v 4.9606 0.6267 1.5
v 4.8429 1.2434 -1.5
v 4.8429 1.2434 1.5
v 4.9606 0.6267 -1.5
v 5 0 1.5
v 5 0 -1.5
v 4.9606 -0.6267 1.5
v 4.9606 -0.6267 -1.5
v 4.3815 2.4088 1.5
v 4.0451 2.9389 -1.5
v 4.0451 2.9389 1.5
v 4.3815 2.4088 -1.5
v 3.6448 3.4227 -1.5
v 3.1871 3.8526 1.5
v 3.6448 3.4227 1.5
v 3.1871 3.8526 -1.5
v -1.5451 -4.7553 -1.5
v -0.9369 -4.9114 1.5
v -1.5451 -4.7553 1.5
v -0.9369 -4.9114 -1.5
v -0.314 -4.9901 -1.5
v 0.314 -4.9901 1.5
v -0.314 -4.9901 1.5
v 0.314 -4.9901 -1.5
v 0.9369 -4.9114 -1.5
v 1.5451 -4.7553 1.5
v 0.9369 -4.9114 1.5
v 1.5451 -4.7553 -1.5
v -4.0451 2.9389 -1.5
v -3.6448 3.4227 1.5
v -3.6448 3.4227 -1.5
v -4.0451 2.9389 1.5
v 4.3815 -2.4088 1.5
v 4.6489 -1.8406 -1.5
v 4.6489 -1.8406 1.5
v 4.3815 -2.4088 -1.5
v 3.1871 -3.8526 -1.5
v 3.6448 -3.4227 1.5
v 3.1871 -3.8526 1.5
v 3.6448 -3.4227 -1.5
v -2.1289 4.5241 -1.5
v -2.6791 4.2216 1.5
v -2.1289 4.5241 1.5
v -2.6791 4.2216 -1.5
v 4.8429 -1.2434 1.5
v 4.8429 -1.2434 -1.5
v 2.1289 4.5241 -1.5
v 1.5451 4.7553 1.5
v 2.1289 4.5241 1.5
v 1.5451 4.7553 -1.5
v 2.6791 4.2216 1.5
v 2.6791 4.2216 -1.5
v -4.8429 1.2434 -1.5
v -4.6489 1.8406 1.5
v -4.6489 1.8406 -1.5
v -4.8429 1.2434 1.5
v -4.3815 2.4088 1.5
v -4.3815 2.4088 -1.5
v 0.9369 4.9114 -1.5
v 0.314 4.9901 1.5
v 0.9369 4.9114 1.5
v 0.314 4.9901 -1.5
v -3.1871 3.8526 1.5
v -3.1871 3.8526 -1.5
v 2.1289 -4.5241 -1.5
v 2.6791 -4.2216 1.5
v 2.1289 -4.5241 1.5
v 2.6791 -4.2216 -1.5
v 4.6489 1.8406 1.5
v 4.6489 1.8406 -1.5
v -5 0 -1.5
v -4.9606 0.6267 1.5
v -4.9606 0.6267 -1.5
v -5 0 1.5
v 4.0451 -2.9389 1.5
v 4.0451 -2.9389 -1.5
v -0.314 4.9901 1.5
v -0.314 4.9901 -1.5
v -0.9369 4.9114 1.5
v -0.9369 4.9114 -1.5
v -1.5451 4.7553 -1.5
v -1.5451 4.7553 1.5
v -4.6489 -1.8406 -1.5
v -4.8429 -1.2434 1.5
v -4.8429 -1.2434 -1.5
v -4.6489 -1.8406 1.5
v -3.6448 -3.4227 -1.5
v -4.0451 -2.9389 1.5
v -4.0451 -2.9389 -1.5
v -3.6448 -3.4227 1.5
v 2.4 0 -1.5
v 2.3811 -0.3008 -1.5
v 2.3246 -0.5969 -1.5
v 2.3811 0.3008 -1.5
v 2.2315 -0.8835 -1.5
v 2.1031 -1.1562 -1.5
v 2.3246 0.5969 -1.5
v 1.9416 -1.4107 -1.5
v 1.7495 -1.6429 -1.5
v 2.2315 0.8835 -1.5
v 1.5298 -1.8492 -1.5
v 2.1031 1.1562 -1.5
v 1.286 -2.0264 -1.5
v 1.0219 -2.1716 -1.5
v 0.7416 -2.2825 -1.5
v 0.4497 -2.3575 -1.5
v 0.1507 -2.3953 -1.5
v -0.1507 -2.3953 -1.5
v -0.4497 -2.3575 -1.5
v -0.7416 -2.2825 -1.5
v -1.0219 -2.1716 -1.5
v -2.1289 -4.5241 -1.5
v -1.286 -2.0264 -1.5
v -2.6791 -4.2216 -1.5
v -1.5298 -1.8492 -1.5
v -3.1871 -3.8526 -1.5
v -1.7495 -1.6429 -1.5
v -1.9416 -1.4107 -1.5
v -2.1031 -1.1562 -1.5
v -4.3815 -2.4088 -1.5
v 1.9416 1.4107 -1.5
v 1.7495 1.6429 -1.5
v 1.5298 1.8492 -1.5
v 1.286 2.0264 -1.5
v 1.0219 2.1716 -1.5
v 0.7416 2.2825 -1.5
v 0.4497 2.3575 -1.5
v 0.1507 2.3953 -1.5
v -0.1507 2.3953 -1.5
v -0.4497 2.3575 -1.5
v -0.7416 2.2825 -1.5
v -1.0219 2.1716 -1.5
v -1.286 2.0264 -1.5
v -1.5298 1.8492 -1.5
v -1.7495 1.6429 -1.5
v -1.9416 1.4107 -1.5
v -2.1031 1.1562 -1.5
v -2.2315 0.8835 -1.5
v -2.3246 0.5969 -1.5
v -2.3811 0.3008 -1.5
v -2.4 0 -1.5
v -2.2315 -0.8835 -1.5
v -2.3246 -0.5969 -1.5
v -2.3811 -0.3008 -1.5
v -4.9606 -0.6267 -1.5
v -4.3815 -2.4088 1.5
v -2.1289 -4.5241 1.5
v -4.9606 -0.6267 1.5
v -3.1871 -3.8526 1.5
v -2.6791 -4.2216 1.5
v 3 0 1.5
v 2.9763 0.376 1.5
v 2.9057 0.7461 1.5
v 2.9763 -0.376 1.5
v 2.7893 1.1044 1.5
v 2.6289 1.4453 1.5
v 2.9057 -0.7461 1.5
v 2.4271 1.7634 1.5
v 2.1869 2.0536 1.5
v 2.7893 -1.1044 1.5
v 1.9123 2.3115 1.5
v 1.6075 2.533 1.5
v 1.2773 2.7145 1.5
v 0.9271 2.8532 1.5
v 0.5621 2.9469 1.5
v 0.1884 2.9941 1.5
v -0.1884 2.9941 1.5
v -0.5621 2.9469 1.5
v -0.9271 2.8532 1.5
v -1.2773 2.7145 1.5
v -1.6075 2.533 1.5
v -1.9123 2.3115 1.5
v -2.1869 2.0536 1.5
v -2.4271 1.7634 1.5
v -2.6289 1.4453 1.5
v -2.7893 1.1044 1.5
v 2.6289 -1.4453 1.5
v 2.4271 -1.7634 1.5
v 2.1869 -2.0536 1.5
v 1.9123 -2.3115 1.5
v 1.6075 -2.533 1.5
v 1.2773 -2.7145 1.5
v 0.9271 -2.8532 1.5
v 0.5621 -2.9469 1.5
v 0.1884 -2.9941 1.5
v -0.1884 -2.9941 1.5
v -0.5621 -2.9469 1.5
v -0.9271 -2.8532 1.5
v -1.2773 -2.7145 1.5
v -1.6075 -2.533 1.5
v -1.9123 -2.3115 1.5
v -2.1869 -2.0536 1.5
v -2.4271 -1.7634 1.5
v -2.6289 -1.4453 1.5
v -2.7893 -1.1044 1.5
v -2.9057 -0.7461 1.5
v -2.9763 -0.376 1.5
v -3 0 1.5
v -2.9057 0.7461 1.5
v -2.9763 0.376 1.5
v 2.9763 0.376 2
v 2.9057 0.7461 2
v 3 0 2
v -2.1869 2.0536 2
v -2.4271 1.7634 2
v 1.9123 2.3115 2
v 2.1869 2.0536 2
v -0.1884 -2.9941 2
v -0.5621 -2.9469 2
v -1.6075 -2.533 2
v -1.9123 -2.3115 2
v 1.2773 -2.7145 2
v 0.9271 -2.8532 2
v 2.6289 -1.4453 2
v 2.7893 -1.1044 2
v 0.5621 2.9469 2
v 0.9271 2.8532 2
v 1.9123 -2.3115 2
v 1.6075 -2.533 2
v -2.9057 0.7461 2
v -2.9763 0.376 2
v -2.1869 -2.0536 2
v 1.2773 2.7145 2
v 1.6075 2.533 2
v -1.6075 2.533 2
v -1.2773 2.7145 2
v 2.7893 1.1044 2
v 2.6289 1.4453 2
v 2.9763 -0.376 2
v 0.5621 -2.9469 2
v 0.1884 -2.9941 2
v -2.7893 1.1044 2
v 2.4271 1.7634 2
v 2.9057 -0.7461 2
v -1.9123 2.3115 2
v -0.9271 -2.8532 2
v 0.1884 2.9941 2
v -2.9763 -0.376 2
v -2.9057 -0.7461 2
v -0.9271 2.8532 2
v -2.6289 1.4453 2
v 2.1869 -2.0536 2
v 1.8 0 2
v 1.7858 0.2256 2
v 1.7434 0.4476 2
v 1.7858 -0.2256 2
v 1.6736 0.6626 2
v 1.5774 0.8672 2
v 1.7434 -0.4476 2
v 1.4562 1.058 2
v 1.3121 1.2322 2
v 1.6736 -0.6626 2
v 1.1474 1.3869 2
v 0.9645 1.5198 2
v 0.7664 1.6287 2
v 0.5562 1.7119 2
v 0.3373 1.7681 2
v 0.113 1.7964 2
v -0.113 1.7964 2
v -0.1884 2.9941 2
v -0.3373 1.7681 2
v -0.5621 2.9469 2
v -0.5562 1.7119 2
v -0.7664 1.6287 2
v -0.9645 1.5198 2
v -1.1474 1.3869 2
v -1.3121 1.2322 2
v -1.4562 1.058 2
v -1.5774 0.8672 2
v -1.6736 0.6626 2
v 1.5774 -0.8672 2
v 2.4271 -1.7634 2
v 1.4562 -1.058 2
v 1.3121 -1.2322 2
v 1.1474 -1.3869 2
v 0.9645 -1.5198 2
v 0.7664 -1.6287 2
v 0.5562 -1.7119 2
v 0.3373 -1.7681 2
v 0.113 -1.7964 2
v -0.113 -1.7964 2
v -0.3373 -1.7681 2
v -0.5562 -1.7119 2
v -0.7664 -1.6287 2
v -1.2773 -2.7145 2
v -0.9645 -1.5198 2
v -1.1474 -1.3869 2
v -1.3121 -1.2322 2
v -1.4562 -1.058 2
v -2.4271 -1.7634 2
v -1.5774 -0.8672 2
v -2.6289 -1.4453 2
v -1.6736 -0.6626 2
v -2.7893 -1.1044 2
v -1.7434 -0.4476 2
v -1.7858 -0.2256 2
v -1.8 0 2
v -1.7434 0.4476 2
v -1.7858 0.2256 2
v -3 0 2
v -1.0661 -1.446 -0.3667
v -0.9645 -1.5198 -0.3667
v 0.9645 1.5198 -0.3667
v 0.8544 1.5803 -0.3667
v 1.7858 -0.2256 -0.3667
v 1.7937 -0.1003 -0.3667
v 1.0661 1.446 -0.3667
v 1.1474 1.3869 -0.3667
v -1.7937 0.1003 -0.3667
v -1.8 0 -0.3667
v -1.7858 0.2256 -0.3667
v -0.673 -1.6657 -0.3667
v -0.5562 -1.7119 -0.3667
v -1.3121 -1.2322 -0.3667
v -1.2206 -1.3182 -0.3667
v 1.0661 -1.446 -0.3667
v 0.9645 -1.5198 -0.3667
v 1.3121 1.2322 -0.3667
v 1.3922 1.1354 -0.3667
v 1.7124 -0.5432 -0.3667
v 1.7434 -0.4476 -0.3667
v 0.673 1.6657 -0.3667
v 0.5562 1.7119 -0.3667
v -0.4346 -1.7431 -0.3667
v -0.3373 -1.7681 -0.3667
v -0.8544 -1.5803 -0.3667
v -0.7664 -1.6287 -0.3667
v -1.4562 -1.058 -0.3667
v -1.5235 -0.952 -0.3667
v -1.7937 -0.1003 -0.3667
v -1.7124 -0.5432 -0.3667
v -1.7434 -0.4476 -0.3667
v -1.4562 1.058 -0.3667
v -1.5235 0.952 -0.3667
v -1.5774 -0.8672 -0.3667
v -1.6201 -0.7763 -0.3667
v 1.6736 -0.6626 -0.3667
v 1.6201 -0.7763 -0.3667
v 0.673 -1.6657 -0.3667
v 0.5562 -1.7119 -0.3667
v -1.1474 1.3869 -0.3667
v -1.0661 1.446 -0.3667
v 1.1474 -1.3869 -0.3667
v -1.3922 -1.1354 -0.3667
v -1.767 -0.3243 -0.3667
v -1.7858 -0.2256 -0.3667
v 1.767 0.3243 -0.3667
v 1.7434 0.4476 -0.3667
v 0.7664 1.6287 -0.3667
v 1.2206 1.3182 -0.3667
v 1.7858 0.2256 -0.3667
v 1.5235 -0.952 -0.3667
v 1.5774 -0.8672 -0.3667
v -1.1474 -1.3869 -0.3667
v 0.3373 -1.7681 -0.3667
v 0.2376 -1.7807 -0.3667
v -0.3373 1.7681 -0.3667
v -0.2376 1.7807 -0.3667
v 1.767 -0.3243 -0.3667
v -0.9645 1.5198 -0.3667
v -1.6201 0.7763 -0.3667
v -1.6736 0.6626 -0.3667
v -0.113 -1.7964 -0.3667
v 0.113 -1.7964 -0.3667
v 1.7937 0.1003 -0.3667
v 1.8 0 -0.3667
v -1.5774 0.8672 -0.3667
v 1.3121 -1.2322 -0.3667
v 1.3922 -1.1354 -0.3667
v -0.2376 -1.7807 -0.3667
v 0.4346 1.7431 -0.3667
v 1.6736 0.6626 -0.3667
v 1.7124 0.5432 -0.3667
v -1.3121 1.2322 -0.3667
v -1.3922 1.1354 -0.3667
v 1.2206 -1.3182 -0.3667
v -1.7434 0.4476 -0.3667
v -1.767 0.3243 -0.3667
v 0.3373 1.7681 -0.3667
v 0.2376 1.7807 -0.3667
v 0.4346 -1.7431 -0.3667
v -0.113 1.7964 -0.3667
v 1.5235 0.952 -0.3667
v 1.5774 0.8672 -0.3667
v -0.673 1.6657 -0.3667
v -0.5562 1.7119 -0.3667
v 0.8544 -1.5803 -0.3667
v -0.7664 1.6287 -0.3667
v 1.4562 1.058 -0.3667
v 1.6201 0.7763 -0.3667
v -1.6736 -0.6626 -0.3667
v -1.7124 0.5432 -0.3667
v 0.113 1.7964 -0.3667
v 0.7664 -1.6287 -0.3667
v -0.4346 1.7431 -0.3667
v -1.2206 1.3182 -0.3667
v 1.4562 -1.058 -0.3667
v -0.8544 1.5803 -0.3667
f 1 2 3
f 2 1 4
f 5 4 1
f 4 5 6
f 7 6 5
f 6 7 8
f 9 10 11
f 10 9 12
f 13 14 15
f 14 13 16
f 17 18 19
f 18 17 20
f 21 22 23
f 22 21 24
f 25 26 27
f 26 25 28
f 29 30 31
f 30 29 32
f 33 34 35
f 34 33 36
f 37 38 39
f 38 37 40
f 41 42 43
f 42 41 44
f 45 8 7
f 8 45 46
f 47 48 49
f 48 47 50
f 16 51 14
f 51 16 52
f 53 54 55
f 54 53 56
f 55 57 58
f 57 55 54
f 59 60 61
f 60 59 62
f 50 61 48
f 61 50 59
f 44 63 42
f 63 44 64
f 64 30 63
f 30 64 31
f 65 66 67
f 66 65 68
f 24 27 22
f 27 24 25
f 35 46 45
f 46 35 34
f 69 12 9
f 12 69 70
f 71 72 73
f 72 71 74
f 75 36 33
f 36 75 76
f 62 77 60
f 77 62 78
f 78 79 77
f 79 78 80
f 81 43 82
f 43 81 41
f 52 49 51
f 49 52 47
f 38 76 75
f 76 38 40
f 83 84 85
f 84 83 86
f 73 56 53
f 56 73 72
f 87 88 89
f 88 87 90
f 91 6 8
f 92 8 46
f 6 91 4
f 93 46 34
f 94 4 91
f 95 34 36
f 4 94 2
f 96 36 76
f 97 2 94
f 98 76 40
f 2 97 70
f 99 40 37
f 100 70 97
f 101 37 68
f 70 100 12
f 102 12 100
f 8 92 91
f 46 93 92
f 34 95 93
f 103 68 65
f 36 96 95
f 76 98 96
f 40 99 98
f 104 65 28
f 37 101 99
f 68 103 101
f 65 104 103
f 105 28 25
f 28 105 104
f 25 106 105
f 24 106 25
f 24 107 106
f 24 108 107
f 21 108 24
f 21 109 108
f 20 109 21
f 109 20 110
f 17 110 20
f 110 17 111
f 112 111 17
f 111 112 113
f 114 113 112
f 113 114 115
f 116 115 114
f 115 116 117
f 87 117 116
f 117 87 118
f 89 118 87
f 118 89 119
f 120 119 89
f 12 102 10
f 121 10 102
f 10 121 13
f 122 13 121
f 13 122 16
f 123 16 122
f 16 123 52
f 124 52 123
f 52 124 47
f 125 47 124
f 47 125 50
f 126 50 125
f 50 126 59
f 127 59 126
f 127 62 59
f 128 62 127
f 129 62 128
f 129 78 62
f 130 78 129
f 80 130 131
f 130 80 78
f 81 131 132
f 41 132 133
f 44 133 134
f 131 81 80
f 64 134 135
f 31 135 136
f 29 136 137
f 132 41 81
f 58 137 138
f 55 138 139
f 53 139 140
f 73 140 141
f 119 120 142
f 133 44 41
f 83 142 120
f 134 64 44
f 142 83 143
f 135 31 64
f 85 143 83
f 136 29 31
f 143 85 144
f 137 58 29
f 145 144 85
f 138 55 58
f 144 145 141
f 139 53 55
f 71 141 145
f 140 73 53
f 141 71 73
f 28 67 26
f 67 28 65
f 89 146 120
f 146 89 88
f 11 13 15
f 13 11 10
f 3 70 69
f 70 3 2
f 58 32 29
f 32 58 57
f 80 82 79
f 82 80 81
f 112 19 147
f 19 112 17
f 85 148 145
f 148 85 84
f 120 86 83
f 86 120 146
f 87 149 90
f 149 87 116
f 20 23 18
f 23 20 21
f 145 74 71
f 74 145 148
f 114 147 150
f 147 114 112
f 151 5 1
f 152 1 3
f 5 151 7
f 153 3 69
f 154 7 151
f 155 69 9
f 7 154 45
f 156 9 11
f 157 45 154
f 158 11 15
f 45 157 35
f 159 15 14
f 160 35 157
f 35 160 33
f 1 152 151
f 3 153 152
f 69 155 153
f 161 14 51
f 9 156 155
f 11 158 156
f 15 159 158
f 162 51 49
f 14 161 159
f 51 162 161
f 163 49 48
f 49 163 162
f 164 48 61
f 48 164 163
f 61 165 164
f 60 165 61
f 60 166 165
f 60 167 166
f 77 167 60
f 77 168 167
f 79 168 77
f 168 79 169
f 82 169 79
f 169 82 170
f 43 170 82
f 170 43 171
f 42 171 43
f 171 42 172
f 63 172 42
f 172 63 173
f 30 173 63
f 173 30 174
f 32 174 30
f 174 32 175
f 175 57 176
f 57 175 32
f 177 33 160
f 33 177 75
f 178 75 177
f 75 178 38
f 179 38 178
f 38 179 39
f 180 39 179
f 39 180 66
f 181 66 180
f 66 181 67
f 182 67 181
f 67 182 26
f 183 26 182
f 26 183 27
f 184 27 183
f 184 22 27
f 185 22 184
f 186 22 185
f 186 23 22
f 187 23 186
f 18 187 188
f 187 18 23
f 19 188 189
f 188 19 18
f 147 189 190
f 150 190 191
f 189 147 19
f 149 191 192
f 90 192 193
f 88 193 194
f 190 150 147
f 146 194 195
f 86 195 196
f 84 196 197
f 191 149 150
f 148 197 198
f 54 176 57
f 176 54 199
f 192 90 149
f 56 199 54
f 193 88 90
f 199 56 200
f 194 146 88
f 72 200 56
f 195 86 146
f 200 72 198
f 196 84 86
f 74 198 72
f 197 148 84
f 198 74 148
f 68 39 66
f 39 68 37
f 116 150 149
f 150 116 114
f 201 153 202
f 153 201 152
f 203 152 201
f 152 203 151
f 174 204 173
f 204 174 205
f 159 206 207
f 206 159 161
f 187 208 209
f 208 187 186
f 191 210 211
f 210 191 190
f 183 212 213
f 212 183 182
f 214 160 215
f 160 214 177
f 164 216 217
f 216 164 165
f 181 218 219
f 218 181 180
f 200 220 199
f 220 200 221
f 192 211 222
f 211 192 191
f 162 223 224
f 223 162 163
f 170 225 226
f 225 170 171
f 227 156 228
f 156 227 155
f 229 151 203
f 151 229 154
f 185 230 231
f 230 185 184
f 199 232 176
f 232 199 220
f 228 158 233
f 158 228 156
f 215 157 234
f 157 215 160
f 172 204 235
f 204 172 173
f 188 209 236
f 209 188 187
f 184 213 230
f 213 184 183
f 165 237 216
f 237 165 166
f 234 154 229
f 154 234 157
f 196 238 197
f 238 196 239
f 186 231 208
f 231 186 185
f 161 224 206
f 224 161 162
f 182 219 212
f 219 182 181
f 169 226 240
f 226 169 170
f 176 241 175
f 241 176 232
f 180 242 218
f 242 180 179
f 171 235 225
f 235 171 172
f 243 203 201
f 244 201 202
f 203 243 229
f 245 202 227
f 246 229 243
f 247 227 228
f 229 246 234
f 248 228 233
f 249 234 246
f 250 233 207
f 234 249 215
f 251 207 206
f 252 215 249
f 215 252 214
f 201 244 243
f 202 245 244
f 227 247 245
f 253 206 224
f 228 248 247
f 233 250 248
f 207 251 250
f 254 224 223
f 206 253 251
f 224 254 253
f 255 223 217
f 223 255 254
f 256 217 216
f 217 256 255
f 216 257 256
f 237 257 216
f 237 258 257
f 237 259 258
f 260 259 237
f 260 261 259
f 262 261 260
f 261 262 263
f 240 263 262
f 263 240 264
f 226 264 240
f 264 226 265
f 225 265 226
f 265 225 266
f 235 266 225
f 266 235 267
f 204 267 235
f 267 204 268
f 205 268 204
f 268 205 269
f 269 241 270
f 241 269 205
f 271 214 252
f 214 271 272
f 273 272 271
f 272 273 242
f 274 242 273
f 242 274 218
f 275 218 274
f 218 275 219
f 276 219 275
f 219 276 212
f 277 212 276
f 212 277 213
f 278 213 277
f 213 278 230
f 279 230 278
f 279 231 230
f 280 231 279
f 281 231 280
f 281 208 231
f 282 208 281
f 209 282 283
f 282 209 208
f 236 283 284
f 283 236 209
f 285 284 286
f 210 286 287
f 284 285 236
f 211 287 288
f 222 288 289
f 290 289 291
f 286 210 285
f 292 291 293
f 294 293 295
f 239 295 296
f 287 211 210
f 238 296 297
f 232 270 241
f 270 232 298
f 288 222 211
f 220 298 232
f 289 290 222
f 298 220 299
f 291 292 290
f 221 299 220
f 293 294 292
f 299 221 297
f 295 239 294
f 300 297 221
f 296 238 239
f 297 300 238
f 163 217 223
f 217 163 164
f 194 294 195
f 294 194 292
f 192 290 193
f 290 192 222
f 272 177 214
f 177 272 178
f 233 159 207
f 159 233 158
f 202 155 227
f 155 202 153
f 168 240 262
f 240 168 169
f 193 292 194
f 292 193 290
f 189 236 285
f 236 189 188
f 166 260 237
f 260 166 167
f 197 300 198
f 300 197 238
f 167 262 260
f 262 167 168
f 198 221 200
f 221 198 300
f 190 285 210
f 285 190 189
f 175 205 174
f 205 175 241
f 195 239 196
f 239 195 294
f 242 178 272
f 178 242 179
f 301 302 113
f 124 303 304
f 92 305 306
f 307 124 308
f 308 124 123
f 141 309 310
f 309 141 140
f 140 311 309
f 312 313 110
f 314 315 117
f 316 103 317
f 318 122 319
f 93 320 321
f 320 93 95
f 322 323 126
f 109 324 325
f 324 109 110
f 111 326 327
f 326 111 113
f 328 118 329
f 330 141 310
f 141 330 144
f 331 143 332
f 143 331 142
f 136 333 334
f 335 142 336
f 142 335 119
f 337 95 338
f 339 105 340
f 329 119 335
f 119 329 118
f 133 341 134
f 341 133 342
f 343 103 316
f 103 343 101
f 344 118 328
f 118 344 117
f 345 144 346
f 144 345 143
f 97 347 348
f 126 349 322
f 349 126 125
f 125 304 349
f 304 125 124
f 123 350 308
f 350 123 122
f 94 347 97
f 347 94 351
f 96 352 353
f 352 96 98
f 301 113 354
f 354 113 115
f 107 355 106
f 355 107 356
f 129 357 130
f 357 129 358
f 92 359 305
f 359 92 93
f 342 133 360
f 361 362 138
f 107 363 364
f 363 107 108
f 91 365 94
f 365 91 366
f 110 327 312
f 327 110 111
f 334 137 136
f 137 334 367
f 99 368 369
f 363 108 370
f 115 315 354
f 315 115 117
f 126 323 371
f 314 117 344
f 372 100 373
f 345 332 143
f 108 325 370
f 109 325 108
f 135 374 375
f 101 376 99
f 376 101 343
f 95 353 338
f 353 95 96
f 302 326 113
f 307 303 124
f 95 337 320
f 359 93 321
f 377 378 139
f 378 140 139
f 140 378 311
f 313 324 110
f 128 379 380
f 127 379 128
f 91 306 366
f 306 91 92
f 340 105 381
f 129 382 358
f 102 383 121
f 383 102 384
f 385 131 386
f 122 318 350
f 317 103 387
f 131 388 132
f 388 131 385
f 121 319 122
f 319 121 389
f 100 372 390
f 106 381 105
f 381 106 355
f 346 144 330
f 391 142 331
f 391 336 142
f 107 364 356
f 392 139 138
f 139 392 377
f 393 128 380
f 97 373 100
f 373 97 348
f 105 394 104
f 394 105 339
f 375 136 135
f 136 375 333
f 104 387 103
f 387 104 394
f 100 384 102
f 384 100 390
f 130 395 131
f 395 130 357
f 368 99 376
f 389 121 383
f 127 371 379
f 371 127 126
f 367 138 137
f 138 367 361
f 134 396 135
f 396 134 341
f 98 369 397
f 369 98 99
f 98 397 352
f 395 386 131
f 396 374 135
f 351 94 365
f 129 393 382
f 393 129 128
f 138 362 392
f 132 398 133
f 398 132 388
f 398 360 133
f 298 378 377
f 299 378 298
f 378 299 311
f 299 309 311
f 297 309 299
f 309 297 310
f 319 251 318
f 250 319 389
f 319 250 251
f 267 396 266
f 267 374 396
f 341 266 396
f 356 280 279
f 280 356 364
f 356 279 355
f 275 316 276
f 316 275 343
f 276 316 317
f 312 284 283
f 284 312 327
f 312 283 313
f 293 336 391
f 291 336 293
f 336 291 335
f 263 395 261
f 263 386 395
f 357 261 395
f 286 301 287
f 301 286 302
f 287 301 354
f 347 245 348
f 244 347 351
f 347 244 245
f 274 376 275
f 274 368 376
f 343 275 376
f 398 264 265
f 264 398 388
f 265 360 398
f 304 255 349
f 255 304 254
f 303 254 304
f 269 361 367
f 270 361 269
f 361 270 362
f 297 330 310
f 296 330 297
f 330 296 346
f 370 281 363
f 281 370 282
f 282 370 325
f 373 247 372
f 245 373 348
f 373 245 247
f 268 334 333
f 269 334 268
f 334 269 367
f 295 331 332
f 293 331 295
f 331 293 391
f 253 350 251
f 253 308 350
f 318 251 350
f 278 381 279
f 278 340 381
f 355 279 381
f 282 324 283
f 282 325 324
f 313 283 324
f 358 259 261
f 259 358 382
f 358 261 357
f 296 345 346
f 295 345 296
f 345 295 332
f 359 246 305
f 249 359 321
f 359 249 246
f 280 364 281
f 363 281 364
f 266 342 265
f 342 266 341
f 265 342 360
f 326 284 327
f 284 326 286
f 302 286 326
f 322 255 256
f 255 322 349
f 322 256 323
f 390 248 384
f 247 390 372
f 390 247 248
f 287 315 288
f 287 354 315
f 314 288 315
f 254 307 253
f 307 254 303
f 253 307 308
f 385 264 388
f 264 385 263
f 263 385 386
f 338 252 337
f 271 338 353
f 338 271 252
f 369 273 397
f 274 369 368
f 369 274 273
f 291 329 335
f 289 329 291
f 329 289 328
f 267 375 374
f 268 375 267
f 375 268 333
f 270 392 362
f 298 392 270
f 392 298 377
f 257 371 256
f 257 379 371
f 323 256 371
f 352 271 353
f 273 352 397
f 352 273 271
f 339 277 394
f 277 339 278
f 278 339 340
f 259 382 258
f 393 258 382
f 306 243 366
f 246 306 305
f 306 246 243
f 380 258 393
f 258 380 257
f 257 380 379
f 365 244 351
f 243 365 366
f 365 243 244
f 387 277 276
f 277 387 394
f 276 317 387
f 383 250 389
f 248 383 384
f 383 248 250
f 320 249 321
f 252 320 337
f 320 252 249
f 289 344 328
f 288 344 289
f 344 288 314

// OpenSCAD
$fn = 50;


difference() {
	union() {
		translate(v = [0, 0, -1.5000000000]) {
			cylinder(h = 3, r = 5.0000000000);
		}
		translate(v = [0, 0, -1.5000000000]) {
			cylinder(h = 3.5000000000, r = 3.0000000000);
		}
	}
	union() {
		translate(v = [0, 0, -1.5000000000]) {
			rotate(a = [0, 180, 0]) {
				difference() {
					union() {
						translate(v = [0, 0, -1.7000000000]) {
							cylinder(h = 1.7000000000, r1 = 1.5000000000, r2 = 2.4000000000);
						}
						translate(v = [0, 0, -3.5000000000]) {
							cylinder(h = 3.5000000000, r = 1.5000000000);
						}
						translate(v = [0, 0, -3.5000000000]) {
							cylinder(h = 3.5000000000, r = 1.8000000000);
						}
						translate(v = [0, 0, -3.5000000000]) {
							cylinder(h = 3.5000000000, r = 1.5000000000);
						}
					}
					union();
				}
			}
		}
		translate(v = [0, 0, -100.0000000000]) {
			cylinder(h = 200, r = 1.5000000000);
		}
	}
}
